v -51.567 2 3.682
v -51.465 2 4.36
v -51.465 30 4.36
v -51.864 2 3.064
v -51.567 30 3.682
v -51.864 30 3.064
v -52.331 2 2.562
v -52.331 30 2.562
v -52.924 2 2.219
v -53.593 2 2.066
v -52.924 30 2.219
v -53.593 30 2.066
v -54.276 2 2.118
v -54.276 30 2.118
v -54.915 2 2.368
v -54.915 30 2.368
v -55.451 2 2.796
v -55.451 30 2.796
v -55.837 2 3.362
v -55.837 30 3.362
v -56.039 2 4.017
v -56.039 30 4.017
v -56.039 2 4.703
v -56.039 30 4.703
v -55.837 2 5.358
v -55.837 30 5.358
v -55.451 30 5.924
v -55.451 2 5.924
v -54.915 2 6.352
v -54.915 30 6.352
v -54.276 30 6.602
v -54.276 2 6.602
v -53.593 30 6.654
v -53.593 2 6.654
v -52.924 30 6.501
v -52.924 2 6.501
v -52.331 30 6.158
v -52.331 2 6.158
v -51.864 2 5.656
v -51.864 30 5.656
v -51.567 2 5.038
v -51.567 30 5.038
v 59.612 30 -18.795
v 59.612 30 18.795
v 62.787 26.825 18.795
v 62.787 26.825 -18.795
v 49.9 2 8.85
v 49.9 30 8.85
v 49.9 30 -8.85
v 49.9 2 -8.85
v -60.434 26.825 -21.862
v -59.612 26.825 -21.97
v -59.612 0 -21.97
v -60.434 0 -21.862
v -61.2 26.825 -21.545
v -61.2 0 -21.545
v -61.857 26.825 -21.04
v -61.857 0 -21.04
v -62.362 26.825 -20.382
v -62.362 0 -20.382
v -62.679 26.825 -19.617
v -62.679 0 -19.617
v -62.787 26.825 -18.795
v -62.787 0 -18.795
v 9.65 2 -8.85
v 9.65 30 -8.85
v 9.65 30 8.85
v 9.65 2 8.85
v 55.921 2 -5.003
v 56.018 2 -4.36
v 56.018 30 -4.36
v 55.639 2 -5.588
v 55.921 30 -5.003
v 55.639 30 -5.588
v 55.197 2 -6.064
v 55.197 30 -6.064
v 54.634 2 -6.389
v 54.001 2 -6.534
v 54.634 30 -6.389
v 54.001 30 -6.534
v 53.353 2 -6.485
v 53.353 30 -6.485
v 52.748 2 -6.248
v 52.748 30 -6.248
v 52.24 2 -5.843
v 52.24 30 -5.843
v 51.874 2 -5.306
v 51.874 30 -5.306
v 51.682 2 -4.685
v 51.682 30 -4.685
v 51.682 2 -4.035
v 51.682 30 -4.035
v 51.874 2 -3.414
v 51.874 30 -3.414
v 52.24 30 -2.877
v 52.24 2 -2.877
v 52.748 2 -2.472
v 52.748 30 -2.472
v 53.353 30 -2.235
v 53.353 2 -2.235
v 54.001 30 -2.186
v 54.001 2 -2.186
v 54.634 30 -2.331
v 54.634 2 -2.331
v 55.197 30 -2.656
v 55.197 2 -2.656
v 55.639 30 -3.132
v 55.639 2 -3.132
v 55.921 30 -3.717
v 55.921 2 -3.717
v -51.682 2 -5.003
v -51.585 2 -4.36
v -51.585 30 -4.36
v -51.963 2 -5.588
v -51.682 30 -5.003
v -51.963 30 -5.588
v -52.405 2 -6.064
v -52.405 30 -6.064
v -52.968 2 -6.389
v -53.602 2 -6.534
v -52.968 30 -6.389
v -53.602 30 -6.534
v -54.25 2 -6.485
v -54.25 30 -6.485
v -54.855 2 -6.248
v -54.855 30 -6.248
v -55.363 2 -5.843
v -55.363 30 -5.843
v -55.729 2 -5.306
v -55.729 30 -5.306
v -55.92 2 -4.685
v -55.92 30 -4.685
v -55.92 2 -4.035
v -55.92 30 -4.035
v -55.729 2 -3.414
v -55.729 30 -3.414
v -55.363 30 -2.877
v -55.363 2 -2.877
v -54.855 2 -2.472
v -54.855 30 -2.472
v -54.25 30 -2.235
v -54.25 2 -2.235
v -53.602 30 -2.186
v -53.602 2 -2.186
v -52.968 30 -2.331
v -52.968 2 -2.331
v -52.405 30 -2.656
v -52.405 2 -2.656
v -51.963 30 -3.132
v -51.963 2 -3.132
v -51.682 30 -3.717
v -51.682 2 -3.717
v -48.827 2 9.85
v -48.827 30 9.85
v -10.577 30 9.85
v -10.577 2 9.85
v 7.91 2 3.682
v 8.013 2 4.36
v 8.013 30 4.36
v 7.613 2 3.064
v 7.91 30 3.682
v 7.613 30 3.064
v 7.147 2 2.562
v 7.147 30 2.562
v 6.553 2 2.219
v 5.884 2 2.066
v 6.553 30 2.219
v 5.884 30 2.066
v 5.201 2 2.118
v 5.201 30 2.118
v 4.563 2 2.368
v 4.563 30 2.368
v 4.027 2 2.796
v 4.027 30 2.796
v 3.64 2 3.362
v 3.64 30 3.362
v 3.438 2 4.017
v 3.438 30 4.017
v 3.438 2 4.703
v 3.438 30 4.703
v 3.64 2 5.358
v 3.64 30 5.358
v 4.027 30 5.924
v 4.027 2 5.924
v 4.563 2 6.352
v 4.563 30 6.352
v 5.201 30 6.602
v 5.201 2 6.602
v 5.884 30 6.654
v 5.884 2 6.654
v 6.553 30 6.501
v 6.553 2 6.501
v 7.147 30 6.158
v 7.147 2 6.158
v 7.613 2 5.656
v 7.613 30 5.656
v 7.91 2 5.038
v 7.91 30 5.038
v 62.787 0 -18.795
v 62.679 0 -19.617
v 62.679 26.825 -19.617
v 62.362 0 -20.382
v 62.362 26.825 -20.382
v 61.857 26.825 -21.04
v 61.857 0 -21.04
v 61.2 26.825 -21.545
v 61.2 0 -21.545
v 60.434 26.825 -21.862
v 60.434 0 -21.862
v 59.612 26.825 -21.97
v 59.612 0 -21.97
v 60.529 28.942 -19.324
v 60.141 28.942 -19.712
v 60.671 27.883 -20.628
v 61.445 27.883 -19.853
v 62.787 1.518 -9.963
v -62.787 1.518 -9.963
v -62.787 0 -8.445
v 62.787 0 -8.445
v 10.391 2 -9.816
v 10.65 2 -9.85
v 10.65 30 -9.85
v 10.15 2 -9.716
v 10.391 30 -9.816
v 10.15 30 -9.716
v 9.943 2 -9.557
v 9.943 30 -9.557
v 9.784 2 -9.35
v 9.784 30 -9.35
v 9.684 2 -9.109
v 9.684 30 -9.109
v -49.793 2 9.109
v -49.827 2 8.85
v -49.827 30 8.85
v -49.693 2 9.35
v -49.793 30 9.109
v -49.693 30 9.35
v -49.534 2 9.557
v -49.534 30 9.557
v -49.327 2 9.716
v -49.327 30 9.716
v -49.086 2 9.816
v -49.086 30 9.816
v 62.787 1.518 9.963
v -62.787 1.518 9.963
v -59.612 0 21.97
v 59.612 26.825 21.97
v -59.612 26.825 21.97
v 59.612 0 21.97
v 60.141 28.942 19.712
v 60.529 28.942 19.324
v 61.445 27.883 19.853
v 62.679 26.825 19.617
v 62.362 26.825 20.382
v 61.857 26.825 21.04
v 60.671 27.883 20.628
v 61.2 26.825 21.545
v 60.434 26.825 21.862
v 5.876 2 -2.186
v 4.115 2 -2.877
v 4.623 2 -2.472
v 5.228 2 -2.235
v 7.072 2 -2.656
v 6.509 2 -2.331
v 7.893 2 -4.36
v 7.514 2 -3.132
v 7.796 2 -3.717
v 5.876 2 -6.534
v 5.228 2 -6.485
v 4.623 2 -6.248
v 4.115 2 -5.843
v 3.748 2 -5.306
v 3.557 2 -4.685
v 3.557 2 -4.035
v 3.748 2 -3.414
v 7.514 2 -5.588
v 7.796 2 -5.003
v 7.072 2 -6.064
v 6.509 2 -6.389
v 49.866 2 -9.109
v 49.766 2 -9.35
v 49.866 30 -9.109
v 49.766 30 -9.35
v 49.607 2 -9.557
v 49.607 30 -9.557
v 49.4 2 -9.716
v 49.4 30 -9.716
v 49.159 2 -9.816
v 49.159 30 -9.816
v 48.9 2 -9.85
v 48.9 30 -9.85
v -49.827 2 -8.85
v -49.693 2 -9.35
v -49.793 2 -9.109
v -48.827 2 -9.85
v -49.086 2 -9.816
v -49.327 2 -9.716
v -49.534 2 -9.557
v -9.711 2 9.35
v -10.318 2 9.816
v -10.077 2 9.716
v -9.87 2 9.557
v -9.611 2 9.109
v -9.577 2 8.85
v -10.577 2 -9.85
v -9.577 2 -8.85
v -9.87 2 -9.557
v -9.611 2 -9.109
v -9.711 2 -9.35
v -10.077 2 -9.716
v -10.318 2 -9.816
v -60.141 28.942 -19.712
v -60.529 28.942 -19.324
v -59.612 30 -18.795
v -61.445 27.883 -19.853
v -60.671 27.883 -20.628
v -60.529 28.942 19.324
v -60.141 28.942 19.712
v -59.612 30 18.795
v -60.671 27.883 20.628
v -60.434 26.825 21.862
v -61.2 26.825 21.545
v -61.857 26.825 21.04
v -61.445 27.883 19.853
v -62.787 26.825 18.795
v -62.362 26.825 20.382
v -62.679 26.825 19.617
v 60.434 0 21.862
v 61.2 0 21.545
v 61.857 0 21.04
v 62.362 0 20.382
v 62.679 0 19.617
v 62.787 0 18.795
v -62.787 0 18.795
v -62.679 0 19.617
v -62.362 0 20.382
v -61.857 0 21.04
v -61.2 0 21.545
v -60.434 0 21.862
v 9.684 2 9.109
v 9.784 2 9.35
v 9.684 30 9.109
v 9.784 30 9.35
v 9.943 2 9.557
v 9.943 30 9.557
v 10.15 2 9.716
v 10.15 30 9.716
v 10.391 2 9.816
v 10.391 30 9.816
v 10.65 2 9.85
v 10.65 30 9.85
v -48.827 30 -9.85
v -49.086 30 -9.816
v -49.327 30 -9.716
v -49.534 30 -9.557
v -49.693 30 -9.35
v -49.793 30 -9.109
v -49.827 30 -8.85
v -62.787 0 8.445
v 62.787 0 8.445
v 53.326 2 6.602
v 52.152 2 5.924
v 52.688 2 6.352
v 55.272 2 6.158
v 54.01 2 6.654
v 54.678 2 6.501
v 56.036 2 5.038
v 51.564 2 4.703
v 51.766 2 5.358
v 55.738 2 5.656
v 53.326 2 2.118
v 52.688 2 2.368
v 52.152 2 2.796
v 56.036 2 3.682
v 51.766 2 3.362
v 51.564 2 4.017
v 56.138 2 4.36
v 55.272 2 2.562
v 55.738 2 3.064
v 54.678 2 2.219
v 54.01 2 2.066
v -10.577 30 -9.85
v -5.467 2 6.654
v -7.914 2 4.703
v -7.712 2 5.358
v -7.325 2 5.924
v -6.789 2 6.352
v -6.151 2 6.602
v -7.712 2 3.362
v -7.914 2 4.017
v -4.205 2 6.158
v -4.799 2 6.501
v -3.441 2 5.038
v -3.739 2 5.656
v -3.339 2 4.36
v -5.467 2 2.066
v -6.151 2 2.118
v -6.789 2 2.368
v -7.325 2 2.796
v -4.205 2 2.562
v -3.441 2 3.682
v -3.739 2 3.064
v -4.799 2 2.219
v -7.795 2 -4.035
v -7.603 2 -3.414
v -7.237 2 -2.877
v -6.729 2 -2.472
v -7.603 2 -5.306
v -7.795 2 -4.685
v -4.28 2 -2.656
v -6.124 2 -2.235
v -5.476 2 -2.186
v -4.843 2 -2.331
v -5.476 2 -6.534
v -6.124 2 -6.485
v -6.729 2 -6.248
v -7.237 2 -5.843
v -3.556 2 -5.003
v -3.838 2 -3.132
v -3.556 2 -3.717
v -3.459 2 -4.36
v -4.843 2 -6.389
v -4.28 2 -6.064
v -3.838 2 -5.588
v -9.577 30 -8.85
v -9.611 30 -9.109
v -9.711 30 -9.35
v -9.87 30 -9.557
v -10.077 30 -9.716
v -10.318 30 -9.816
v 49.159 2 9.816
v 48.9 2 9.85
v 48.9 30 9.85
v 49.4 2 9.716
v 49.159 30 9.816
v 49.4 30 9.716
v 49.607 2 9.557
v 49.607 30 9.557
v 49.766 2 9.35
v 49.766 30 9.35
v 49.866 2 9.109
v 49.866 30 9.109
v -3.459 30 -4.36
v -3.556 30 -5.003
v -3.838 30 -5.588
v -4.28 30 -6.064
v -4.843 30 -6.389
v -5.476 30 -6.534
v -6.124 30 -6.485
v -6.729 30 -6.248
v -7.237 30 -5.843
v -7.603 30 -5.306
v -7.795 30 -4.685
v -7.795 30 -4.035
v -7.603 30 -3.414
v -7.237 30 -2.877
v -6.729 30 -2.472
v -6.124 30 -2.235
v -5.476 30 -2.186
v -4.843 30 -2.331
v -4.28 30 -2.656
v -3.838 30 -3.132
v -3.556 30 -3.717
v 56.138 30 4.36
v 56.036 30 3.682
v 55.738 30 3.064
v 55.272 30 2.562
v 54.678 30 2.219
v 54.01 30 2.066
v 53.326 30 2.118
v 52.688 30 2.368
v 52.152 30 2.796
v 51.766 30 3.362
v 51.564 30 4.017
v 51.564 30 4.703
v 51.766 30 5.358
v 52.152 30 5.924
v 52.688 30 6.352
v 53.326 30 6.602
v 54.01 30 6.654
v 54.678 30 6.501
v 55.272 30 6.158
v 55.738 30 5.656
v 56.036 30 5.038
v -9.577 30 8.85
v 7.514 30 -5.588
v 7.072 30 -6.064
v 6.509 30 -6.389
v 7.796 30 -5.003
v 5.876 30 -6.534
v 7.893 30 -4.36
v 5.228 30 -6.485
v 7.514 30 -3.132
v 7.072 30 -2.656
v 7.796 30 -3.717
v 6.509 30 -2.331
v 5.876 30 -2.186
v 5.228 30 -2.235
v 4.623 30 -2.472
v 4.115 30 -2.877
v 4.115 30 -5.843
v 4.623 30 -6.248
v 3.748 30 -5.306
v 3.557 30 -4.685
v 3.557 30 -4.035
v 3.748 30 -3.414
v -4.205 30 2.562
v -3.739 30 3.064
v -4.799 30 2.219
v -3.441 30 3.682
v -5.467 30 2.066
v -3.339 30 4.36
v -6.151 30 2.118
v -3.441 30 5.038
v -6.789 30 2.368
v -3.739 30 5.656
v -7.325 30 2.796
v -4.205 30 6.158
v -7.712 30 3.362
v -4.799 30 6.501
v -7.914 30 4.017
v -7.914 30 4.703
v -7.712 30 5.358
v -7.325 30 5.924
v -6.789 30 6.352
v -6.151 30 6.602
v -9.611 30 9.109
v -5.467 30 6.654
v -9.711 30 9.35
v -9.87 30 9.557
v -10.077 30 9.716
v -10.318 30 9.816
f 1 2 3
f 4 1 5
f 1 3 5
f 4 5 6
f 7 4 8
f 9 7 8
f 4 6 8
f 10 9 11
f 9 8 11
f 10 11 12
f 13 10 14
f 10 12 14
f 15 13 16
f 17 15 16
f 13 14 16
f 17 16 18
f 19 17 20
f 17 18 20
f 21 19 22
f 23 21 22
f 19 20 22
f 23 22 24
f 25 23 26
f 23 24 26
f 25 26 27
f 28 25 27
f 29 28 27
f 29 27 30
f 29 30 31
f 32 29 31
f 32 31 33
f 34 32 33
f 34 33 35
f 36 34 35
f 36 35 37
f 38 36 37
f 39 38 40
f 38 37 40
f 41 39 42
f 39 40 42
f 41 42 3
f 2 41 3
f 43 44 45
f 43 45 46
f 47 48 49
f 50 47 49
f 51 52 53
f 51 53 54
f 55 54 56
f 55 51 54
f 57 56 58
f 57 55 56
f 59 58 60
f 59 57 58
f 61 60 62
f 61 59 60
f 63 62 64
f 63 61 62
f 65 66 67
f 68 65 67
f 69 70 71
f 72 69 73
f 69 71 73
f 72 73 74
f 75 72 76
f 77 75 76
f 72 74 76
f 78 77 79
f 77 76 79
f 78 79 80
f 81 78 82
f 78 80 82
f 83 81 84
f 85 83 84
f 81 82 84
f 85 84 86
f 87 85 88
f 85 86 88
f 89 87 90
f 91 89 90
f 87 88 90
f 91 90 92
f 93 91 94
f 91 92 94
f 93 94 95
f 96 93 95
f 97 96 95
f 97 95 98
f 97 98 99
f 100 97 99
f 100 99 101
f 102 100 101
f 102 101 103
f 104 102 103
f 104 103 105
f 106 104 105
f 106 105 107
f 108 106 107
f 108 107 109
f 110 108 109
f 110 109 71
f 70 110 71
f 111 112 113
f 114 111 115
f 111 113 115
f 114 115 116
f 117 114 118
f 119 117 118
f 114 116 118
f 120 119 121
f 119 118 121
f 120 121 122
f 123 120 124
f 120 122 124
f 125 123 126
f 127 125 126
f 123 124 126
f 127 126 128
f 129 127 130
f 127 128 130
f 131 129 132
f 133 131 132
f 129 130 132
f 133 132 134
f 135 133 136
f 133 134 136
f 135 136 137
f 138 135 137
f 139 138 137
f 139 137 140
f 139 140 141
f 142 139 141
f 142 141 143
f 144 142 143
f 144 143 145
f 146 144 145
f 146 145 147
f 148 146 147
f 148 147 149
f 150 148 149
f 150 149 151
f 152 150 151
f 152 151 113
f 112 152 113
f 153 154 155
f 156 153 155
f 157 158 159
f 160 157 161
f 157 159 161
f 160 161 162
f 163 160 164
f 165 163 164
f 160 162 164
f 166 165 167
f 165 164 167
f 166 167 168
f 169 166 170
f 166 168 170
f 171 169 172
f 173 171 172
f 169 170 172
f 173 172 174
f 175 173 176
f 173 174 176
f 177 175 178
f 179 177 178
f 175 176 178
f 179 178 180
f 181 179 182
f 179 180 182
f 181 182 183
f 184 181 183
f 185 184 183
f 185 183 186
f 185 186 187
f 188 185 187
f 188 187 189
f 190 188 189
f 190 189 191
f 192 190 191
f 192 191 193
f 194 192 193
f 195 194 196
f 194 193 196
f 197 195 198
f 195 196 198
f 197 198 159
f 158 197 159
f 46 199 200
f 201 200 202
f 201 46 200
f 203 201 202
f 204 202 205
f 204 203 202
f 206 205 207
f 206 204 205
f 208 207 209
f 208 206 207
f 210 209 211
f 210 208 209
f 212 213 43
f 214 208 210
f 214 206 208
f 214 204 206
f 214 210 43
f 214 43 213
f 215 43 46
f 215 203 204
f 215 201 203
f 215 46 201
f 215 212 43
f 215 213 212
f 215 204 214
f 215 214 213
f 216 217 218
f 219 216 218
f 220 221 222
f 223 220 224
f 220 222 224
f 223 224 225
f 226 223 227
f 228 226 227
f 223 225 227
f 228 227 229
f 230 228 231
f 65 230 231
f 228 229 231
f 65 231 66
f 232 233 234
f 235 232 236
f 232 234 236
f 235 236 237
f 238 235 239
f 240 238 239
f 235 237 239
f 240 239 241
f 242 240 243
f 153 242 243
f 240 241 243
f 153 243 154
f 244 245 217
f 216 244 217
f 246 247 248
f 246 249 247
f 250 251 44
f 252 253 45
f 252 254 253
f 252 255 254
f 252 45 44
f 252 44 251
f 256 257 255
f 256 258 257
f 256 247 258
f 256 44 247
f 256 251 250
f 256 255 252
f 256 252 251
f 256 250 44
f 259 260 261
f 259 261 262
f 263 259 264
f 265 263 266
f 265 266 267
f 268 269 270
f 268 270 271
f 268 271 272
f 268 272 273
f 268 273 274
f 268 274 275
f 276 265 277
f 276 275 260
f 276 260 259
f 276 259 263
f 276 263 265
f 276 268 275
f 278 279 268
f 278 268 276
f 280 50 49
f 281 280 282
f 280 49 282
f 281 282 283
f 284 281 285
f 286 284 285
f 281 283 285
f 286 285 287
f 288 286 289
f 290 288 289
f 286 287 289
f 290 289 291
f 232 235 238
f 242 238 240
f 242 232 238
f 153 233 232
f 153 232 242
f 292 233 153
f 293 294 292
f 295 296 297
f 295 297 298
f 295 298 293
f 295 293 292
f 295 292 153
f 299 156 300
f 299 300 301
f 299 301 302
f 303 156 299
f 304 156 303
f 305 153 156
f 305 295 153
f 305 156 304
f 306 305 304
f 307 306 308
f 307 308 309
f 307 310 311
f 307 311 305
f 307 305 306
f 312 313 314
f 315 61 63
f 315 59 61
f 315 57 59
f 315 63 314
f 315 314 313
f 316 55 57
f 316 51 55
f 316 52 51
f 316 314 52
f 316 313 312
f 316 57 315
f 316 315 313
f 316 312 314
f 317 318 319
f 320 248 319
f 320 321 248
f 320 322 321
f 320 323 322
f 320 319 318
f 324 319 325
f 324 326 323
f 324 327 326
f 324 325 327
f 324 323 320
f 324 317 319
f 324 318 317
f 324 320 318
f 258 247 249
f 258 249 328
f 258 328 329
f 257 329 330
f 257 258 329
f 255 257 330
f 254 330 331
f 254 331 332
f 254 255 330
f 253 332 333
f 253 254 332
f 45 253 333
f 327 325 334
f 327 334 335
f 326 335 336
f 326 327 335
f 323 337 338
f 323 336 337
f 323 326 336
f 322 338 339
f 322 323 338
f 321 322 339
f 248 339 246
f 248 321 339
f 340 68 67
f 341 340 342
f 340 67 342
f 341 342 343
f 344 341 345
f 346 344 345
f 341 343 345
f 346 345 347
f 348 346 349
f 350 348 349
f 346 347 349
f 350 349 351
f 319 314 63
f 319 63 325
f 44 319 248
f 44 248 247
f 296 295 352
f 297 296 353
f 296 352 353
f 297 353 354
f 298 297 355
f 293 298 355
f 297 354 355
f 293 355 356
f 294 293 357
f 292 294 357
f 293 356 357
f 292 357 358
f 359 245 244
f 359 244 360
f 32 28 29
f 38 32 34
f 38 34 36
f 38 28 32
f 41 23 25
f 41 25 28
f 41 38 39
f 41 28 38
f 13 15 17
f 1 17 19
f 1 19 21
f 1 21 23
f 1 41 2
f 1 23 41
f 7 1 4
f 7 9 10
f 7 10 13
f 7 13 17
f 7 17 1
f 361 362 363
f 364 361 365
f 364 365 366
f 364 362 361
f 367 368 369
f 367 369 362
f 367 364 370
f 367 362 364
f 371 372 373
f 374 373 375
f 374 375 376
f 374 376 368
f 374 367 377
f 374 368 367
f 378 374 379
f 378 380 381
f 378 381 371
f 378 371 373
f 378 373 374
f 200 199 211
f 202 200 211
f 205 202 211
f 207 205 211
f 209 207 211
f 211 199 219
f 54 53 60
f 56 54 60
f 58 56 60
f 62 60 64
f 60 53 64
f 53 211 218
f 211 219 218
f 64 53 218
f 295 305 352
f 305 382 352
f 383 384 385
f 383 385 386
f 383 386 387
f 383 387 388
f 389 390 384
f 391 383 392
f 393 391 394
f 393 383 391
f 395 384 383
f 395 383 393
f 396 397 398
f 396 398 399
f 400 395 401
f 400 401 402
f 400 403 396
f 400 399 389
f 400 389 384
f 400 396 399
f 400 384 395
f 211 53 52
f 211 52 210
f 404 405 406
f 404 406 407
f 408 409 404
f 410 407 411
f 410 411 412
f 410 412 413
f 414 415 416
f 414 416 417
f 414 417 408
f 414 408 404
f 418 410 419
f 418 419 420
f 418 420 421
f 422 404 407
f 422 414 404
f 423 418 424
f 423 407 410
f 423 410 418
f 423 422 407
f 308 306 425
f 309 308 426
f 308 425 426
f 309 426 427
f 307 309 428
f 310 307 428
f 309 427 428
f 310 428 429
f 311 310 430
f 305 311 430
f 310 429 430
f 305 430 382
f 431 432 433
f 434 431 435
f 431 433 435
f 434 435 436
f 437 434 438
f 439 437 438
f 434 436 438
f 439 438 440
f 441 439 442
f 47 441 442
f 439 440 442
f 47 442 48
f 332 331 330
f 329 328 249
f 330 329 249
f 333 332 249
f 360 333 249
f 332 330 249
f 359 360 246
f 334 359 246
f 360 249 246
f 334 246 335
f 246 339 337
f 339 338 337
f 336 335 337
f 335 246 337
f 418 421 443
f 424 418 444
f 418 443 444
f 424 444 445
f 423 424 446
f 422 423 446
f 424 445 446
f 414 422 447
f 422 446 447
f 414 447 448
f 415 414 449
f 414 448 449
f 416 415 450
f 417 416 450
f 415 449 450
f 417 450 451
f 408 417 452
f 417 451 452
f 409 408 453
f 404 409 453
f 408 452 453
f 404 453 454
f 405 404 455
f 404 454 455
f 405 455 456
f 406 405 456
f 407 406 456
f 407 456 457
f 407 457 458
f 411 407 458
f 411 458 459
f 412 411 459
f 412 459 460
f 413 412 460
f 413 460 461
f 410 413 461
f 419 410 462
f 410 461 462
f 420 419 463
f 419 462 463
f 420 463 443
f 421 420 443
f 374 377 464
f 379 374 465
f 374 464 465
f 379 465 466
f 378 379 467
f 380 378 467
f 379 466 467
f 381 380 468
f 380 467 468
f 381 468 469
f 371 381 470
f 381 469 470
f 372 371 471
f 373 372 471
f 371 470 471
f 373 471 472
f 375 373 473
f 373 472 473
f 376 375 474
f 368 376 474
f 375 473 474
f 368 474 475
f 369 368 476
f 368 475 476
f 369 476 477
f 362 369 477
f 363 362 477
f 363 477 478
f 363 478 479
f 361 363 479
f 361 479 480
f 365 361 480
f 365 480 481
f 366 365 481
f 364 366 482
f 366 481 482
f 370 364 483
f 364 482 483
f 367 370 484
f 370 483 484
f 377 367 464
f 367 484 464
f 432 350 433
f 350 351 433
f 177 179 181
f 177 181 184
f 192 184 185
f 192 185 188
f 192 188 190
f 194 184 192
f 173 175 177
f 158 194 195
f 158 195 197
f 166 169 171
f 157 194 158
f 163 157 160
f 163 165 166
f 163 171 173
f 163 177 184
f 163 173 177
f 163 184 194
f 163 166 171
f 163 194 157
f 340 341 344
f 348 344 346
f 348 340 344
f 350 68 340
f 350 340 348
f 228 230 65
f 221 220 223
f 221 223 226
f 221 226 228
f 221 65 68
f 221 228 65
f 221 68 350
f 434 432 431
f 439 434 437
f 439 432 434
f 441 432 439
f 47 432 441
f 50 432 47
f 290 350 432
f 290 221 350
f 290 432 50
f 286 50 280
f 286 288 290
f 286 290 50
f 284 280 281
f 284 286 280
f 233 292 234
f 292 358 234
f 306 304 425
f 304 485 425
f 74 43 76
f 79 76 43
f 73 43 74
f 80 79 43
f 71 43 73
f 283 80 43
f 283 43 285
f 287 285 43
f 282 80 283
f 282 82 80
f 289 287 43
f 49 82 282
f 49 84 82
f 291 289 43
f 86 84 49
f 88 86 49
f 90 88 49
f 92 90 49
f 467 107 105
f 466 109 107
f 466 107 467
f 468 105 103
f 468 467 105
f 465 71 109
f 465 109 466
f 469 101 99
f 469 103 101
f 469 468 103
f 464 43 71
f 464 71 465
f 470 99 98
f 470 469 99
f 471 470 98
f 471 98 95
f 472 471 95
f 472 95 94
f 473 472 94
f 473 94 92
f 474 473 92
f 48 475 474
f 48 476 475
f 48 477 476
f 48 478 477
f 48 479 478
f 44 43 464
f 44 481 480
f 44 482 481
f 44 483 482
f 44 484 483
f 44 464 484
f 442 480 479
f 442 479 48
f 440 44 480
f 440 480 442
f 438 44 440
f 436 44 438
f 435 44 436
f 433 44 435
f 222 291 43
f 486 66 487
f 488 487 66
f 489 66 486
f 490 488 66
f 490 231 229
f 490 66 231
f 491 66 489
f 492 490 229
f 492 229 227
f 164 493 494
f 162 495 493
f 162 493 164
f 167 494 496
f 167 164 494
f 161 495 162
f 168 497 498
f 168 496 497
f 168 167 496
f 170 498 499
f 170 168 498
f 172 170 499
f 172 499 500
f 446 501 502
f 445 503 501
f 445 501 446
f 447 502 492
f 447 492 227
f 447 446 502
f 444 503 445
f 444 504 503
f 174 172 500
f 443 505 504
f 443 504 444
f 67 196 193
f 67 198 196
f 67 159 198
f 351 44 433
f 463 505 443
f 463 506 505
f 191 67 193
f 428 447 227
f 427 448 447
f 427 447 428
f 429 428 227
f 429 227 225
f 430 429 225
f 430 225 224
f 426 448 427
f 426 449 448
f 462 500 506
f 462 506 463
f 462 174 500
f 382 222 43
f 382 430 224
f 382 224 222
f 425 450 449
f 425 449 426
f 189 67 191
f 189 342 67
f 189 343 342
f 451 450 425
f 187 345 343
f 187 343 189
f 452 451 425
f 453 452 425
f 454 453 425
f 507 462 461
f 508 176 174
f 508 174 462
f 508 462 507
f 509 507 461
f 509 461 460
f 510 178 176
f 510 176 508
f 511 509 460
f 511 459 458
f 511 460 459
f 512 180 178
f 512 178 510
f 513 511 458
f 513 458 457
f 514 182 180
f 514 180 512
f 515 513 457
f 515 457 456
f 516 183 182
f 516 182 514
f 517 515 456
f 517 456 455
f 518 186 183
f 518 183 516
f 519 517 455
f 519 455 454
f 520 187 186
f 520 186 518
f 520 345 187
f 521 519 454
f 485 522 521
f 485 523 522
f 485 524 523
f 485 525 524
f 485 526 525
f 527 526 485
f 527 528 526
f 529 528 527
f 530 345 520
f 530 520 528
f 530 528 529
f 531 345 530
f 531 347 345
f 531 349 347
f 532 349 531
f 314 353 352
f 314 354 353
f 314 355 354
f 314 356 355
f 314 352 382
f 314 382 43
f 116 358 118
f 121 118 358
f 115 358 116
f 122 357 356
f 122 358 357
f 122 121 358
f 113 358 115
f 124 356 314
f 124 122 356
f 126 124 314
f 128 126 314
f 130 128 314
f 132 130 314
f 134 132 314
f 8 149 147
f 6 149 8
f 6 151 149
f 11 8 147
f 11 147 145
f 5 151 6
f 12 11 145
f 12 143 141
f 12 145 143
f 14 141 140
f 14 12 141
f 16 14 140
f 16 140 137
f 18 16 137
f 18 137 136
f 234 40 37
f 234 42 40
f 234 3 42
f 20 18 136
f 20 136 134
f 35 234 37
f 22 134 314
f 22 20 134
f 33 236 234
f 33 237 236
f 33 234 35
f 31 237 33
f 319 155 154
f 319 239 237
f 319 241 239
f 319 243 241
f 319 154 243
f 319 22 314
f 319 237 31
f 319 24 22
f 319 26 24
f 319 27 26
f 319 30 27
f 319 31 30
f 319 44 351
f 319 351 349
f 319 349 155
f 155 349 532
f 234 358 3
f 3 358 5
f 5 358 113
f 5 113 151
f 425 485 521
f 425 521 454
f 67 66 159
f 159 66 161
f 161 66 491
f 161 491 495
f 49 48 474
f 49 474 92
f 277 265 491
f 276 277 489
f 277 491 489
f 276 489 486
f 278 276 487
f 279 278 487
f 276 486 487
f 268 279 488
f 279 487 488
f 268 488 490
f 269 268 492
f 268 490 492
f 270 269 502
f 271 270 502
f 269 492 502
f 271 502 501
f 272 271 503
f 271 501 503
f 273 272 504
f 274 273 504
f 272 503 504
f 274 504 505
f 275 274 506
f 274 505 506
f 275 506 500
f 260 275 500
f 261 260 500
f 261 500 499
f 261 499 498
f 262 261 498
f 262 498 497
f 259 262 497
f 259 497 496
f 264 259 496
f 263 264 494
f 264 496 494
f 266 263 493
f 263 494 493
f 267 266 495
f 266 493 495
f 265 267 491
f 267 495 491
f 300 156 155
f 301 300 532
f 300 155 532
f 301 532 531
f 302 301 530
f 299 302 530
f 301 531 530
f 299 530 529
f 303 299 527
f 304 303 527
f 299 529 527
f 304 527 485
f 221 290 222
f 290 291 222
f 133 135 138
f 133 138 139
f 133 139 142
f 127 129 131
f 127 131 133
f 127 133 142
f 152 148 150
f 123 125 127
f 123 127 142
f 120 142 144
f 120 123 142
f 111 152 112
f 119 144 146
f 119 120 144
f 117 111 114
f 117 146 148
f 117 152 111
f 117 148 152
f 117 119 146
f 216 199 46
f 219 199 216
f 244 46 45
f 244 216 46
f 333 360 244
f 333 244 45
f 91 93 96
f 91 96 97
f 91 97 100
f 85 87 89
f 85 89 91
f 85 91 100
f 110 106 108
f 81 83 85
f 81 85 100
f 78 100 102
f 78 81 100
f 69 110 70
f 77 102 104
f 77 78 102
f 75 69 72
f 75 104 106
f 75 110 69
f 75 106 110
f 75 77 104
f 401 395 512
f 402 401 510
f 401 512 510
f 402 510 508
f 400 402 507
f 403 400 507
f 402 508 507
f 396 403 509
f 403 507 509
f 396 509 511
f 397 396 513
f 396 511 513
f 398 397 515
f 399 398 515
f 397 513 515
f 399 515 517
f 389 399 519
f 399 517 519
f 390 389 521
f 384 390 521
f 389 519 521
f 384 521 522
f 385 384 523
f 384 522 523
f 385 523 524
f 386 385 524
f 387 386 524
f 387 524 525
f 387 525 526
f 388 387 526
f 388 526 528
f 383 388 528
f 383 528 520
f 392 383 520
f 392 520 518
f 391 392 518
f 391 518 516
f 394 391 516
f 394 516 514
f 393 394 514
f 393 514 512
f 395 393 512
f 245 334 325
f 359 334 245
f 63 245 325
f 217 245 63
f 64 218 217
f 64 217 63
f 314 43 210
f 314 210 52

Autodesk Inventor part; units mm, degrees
ref_plane "XZ Plane" through (0, 0, 0) normal (0, 1, 0) x (-1, 0, 0)
sketch "Sketch1" plane through (0, 0, 0) normal (0, 1, 0) x (-1, 0, 0)
  line L0 (-10.577, 9.85) -> (-48.827, 9.85) construction
  arc A0 (-9.577, 8.85) -> (-10.577, 9.85) centre (-10.577, 8.85) ccw construction
  line L1 (-9.577, -8.85) -> (-9.577, 8.85) construction
  arc A1 (-10.577, -9.85) -> (-9.577, -8.85) centre (-10.577, -8.85) ccw construction
  line L2 (-48.827, -9.85) -> (-10.577, -9.85) construction
  arc A2 (-49.827, -8.85) -> (-48.827, -9.85) centre (-48.827, -8.85) ccw construction
  line L3 (-49.827, 8.85) -> (-49.827, -8.85) construction
  arc A3 (-48.827, 9.85) -> (-49.827, 8.85) centre (-48.827, 8.85) ccw construction
  circle A4 centre (-19.427, 0) radius 6.44 construction
  circle A5 centre (-19.427, 0) radius 5.44 construction
  line L4 (-9.577, 9.475) -> (-3.217, 9.475) construction
  arc A6 (-2.217, 8.475) -> (-3.217, 9.475) centre (-3.217, 8.475) ccw construction
  line L5 (-2.217, -8.475) -> (-2.217, 8.475) construction
  arc A7 (-3.217, -9.475) -> (-2.217, -8.475) centre (-3.217, -8.475) ccw construction
  line L6 (-9.577, -9.475) -> (-3.217, -9.475) construction
  circle A8 centre (-5.6393, -4.36) radius 2.3 construction
  circle A9 centre (-5.6393, 4.36) radius 2.18 construction
  line L7 (-49.6076, 9.475) -> (-56.187, 9.475) construction
  arc A10 (-56.187, 9.475) -> (-57.187, 8.475) centre (-56.187, 8.475) ccw construction
  line L8 (-57.187, -8.475) -> (-57.187, 8.475) construction
  circle A11 centre (-53.7647, 4.36) radius 2.18 construction
  circle A12 centre (-53.7647, -4.36) radius 2.3 construction
  line L9 (-56.187, -9.475) -> (-49.6076, -9.475) construction
  arc A13 (-57.187, -8.475) -> (-56.187, -9.475) centre (-56.187, -8.475) ccw construction
  line L10 (48.9003, 9.85) -> (10.6503, 9.85) construction
  arc A14 (49.9003, 8.85) -> (48.9003, 9.85) centre (48.9003, 8.85) ccw construction
  line L11 (49.9003, -8.85) -> (49.9003, 8.85) construction
  arc A15 (48.9003, -9.85) -> (49.9003, -8.85) centre (48.9003, -8.85) ccw construction
  line L12 (10.6503, -9.85) -> (48.9003, -9.85) construction
  arc A16 (9.6503, -8.85) -> (10.6503, -9.85) centre (10.6503, -8.85) ccw construction
  line L13 (9.6503, 8.85) -> (9.6503, -8.85) construction
  arc A17 (10.6503, 9.85) -> (9.6503, 8.85) centre (10.6503, 8.85) ccw construction
  circle A18 centre (40.0503, 0) radius 6.44 construction
  circle A19 centre (40.0503, 0) radius 5.44 construction
  line L14 (49.9003, 9.475) -> (56.2603, 9.475) construction
  arc A20 (57.2603, 8.475) -> (56.2603, 9.475) centre (56.2603, 8.475) ccw construction
  line L15 (57.2603, -8.475) -> (57.2603, 8.475) construction
  arc A21 (56.2603, -9.475) -> (57.2603, -8.475) centre (56.2603, -8.475) ccw construction
  line L16 (49.9003, -9.475) -> (56.2603, -9.475) construction
  circle A22 centre (53.838, -4.36) radius 2.3 construction
  circle A23 centre (53.838, 4.36) radius 2.18 construction
  line L17 (9.8697, 9.475) -> (3.2903, 9.475) construction
  arc A24 (3.2903, 9.475) -> (2.2903, 8.475) centre (3.2903, 8.475) ccw construction
  line L18 (2.2903, -8.475) -> (2.2903, 8.475) construction
  circle A25 centre (5.7126, 4.36) radius 2.18 construction
  circle A26 centre (5.7126, -4.36) radius 2.3 construction
  line L19 (3.2903, -9.475) -> (9.8697, -9.475) construction
  arc A27 (2.2903, -8.475) -> (3.2903, -9.475) centre (3.2903, -8.475) ccw construction
  line L20 (-62.7873, 21.97) -> (62.7873, 21.97)
  line L21 (62.7873, 21.97) -> (62.7873, -21.97)
  line L22 (62.7873, -21.97) -> (-62.7873, -21.97)
  line L23 (-62.7873, -21.97) -> (-62.7873, 21.97)
  line L24 (-62.7873, 21.97) -> (62.7873, -21.97) construction
  line L25 (62.7873, 21.97) -> (-62.7873, -21.97) construction
  point P0 (0, 0)
extrude "Socle" add sketch "Sketch1" along normal blind 30
sketch "Sketch2" plane through (0, 30, 0) normal (0, 1, 0) x (1, 0, 0)
  line L0 (-10.577, 9.85) -> (-48.827, 9.85)
  arc A0 (-9.577, 8.85) -> (-10.577, 9.85) centre (-10.577, 8.85) ccw
  line L1 (-9.577, -8.85) -> (-9.577, 8.85)
  arc A1 (-10.577, -9.85) -> (-9.577, -8.85) centre (-10.577, -8.85) ccw
  line L2 (-48.827, -9.85) -> (-10.577, -9.85)
  arc A2 (-49.827, -8.85) -> (-48.827, -9.85) centre (-48.827, -8.85) ccw
  line L3 (-49.827, 8.85) -> (-49.827, -8.85)
  arc A3 (-48.827, 9.85) -> (-49.827, 8.85) centre (-48.827, 8.85) ccw
  circle A4 centre (-19.427, 0) radius 6.44 construction
  circle A5 centre (-19.427, 0) radius 5.44 construction
  line L4 (-9.577, 9.475) -> (-3.217, 9.475) construction
  arc A6 (-2.217, 8.475) -> (-3.217, 9.475) centre (-3.217, 8.475) ccw construction
  line L5 (-2.217, -8.475) -> (-2.217, 8.475) construction
  arc A7 (-3.217, -9.475) -> (-2.217, -8.475) centre (-3.217, -8.475) ccw construction
  line L6 (-9.577, -9.475) -> (-3.217, -9.475) construction
  circle A8 centre (-5.6393, -4.36) radius 2.3
  circle A9 centre (-5.6393, 4.36) radius 2.18
  line L7 (-49.6076, 9.475) -> (-56.187, 9.475) construction
  arc A10 (-56.187, 9.475) -> (-57.187, 8.475) centre (-56.187, 8.475) ccw construction
  line L8 (-57.187, -8.475) -> (-57.187, 8.475) construction
  circle A11 centre (-53.7647, 4.36) radius 2.18
  circle A12 centre (-53.7647, -4.36) radius 2.3
  line L9 (-56.187, -9.475) -> (-49.6076, -9.475) construction
  arc A13 (-57.187, -8.475) -> (-56.187, -9.475) centre (-56.187, -8.475) ccw construction
  circle A14 centre (40.0503, 0) radius 5.44 construction
  circle A15 centre (40.0503, 0) radius 6.44 construction
  line L10 (48.9003, 9.85) -> (10.6503, 9.85)
  line L11 (10.6503, -9.85) -> (48.9003, -9.85)
  arc A16 (48.9003, -9.85) -> (49.9003, -8.85) centre (48.9003, -8.85) ccw
  arc A17 (49.9003, 8.85) -> (48.9003, 9.85) centre (48.9003, 8.85) ccw
  line L12 (49.9003, -8.85) -> (49.9003, 8.85)
  circle A18 centre (53.838, 4.36) radius 2.18
  line L13 (49.9003, 9.475) -> (56.2603, 9.475) construction
  arc A19 (57.2603, 8.475) -> (56.2603, 9.475) centre (56.2603, 8.475) ccw construction
  line L14 (57.2603, -8.475) -> (57.2603, 8.475) construction
  circle A20 centre (53.838, -4.36) radius 2.3
  line L15 (49.9003, -9.475) -> (56.2603, -9.475) construction
  arc A21 (56.2603, -9.475) -> (57.2603, -8.475) centre (56.2603, -8.475) ccw construction
  arc A22 (9.6503, -8.85) -> (10.6503, -9.85) centre (10.6503, -8.85) ccw
  line L16 (9.6503, 8.85) -> (9.6503, -8.85)
  arc A23 (10.6503, 9.85) -> (9.6503, 8.85) centre (10.6503, 8.85) ccw
  line L17 (9.8697, 9.475) -> (3.2903, 9.475) construction
  circle A24 centre (5.7126, 4.36) radius 2.18
  arc A25 (3.2903, 9.475) -> (2.2903, 8.475) centre (3.2903, 8.475) ccw construction
  line L18 (2.2903, -8.475) -> (2.2903, 8.475) construction
  circle A26 centre (5.7126, -4.36) radius 2.3
  line L19 (3.2903, -9.475) -> (9.8697, -9.475) construction
  arc A27 (2.2903, -8.475) -> (3.2903, -9.475) centre (3.2903, -8.475) ccw construction
  line L20 (-62.7873, 21.97) -> (62.7873, 21.97) construction
  line L21 (62.7873, 21.97) -> (62.7873, -21.97) construction
  line L22 (62.7873, -21.97) -> (-62.7873, -21.97) construction
  line L23 (-62.7873, -21.97) -> (-62.7873, 21.97) construction
  line L24 (-62.7873, 21.97) -> (62.7873, -21.97) construction
  line L25 (62.7873, 21.97) -> (-62.7873, -21.97) construction
  point P0 (0, 0)
  point P1 (0, 0)
  point P2 (0, 0)
extrude "empreinte" cut sketch "Sketch2" against normal blind 28
fillet "Fillet1" radius 3.175 1 edges at (-62.7873, 15, 21.97)
fillet "Fillet2" radius 3.175 1 edges at (62.7873, 15, 21.97)
fillet "Fillet3" radius 3.175 1 edges at (62.7873, 15, -21.97)
fillet "Fillet4" radius 3.175 1 edges at (-62.7873, 15, -21.97)
chamfer "Chamfer1" distance 3.175 angle 45 8 edges at (0, 30, 21.97) (61.8574, 30, 21.0401) (62.7873, 30, 0) (61.8574, 30, -21.0401) (0, 30, -21.97) (-61.8574, 30, -21.0401) (-62.7873, 30, 0) (-61.8574, 30, 21.0401)
sketch "Sketch3" plane through (-62.7873, 0, -18.795) normal (-1, 0, 0) x (0, 0, 1)
  point P0 (18.795, 0)
sketch "Sketch4" plane through (-62.7873, 0, -18.795) normal (-1, 0, 0) x (0, 0, 1)
  line L0 (-3.175, 0) -> (-3.175, 26.825) projected
  line L1 (0, 0) -> (-3.175, 0) projected
  line L2 (0, 0) -> (37.59, 0) projected
  line L3 (40.765, 0) -> (37.59, 0) projected
  line L4 (40.765, 26.825) -> (40.765, 0) projected
  point P0 (18.795, 0)
sketch "Sketch5" plane through (-62.7873, 0, -18.795) normal (-1, 0, 0) x (0, 0, 1)
  line L0 (12.255, 30) -> (12.255, 2) construction
  line L1 (28.758, 1.5182) -> (8.832, 1.5182)
  line L2 (8.832, 1.5182) -> (8.832, 0) construction
  line L3 (8.832, 0) -> (28.758, 0) construction
  line L4 (28.758, 0) -> (28.758, 1.5182) construction
  line L5 (28.758, 1.5182) -> (8.832, 0) construction
  line L6 (8.832, 1.5182) -> (28.758, 0) construction
  line L7 (25.455, 30) -> (25.455, 2) construction
  line L8 (8.832, 1.5182) -> (10.3503, 0)
  line L9 (8.832, 1.5182) -> (10.9792, 1.5182) construction
  line L10 (28.758, 1.5182) -> (27.2397, 0)
  line L11 (28.758, 1.5182) -> (30.9051, 1.5182) construction
  line L12 (10.3503, 0) -> (27.2397, 0) construction
  line L13 (10.3503, 0) -> (27.2397, 0)
  line L14 (37.59, 0) -> (0, 0) projected
  point P0 (18.795, 0)
  point P1 (18.795, 0.7591)
  dimension "d11" = 45
  dimension "d12" = 135
extrude "Extrusion3" cut sketch "Sketch5" against normal blind 125.8875
sketch "Sketch6" plane through (62.7873, 0, -18.795) normal (1, 0, 0) x (0, 0, -1)
  line L0 (-28.758, 1.5182) -> (-8.832, 1.5182) projected
  line L1 (-8.832, 1.5182) -> (-10.3503, 0) projected
  line L2 (0, 0) -> (-10.3503, 0) projected
  line L3 (3.175, 0) -> (0, 0) projected
  line L4 (3.175, 0) -> (3.175, 26.825) projected
  line L5 (0, 30) -> (3.175, 26.825) projected
  line L6 (0, 30) -> (-37.59, 30) projected
  line L7 (-40.765, 26.825) -> (-37.59, 30) projected
  line L8 (-40.765, 26.825) -> (-40.765, 0) projected
  line L9 (-37.59, 0) -> (-40.765, 0) projected
  line L10 (-27.2397, 0) -> (-37.59, 0) projected
  line L11 (-9.945, 30) -> (-9.945, 2) projected
  line L12 (-28.645, 30) -> (-28.645, 2) projected
  line L13 (-27.2397, 0) -> (-28.758, 1.5182) projected
  point P0 (-18.795, 0)
sketch "Sketch7" plane through (59.6123, 0, -21.97) normal (0, 0, -1) x (-1, 0, 0)
  point P0 (59.6123, 0)
sketch "Sketch8" plane through (0, 30, 0) normal (0, 1, 0) x (1, 0, 0)
  line L0 (9.6503, -8.85) -> (9.6503, 8.85) projected
  line L1 (10.6503, 9.85) -> (48.9003, 9.85) projected
  line L2 (48.9003, -9.85) -> (10.6503, -9.85) projected
  line L3 (59.6123, -18.795) -> (-59.6123, -18.795) projected
  line L4 (-59.6123, -21.97) -> (59.6123, -21.97) projected
  line L5 (62.7873, 18.795) -> (62.7873, -18.795) projected
  line L6 (62.7873, -21.97) -> (62.7873, -18.795) projected
  line L7 (59.6123, 21.97) -> (-59.6123, 21.97) projected
  line L8 (-62.7873, 18.795) -> (-62.7873, -18.795) projected
  arc A0 (-59.6123, 21.97) -> (-62.7873, 18.795) centre (-59.6123, 18.795) ccw projected
  arc A1 (-62.7873, -18.795) -> (-59.6123, -21.97) centre (-59.6123, -18.795) ccw projected
  arc A2 (62.7873, 18.795) -> (59.6123, 21.97) centre (59.6123, 18.795) ccw projected
  line L9 (-10.577, -9.85) -> (-48.827, -9.85) projected
  point P0 (0, 0)
properties part number "Socle servo"
